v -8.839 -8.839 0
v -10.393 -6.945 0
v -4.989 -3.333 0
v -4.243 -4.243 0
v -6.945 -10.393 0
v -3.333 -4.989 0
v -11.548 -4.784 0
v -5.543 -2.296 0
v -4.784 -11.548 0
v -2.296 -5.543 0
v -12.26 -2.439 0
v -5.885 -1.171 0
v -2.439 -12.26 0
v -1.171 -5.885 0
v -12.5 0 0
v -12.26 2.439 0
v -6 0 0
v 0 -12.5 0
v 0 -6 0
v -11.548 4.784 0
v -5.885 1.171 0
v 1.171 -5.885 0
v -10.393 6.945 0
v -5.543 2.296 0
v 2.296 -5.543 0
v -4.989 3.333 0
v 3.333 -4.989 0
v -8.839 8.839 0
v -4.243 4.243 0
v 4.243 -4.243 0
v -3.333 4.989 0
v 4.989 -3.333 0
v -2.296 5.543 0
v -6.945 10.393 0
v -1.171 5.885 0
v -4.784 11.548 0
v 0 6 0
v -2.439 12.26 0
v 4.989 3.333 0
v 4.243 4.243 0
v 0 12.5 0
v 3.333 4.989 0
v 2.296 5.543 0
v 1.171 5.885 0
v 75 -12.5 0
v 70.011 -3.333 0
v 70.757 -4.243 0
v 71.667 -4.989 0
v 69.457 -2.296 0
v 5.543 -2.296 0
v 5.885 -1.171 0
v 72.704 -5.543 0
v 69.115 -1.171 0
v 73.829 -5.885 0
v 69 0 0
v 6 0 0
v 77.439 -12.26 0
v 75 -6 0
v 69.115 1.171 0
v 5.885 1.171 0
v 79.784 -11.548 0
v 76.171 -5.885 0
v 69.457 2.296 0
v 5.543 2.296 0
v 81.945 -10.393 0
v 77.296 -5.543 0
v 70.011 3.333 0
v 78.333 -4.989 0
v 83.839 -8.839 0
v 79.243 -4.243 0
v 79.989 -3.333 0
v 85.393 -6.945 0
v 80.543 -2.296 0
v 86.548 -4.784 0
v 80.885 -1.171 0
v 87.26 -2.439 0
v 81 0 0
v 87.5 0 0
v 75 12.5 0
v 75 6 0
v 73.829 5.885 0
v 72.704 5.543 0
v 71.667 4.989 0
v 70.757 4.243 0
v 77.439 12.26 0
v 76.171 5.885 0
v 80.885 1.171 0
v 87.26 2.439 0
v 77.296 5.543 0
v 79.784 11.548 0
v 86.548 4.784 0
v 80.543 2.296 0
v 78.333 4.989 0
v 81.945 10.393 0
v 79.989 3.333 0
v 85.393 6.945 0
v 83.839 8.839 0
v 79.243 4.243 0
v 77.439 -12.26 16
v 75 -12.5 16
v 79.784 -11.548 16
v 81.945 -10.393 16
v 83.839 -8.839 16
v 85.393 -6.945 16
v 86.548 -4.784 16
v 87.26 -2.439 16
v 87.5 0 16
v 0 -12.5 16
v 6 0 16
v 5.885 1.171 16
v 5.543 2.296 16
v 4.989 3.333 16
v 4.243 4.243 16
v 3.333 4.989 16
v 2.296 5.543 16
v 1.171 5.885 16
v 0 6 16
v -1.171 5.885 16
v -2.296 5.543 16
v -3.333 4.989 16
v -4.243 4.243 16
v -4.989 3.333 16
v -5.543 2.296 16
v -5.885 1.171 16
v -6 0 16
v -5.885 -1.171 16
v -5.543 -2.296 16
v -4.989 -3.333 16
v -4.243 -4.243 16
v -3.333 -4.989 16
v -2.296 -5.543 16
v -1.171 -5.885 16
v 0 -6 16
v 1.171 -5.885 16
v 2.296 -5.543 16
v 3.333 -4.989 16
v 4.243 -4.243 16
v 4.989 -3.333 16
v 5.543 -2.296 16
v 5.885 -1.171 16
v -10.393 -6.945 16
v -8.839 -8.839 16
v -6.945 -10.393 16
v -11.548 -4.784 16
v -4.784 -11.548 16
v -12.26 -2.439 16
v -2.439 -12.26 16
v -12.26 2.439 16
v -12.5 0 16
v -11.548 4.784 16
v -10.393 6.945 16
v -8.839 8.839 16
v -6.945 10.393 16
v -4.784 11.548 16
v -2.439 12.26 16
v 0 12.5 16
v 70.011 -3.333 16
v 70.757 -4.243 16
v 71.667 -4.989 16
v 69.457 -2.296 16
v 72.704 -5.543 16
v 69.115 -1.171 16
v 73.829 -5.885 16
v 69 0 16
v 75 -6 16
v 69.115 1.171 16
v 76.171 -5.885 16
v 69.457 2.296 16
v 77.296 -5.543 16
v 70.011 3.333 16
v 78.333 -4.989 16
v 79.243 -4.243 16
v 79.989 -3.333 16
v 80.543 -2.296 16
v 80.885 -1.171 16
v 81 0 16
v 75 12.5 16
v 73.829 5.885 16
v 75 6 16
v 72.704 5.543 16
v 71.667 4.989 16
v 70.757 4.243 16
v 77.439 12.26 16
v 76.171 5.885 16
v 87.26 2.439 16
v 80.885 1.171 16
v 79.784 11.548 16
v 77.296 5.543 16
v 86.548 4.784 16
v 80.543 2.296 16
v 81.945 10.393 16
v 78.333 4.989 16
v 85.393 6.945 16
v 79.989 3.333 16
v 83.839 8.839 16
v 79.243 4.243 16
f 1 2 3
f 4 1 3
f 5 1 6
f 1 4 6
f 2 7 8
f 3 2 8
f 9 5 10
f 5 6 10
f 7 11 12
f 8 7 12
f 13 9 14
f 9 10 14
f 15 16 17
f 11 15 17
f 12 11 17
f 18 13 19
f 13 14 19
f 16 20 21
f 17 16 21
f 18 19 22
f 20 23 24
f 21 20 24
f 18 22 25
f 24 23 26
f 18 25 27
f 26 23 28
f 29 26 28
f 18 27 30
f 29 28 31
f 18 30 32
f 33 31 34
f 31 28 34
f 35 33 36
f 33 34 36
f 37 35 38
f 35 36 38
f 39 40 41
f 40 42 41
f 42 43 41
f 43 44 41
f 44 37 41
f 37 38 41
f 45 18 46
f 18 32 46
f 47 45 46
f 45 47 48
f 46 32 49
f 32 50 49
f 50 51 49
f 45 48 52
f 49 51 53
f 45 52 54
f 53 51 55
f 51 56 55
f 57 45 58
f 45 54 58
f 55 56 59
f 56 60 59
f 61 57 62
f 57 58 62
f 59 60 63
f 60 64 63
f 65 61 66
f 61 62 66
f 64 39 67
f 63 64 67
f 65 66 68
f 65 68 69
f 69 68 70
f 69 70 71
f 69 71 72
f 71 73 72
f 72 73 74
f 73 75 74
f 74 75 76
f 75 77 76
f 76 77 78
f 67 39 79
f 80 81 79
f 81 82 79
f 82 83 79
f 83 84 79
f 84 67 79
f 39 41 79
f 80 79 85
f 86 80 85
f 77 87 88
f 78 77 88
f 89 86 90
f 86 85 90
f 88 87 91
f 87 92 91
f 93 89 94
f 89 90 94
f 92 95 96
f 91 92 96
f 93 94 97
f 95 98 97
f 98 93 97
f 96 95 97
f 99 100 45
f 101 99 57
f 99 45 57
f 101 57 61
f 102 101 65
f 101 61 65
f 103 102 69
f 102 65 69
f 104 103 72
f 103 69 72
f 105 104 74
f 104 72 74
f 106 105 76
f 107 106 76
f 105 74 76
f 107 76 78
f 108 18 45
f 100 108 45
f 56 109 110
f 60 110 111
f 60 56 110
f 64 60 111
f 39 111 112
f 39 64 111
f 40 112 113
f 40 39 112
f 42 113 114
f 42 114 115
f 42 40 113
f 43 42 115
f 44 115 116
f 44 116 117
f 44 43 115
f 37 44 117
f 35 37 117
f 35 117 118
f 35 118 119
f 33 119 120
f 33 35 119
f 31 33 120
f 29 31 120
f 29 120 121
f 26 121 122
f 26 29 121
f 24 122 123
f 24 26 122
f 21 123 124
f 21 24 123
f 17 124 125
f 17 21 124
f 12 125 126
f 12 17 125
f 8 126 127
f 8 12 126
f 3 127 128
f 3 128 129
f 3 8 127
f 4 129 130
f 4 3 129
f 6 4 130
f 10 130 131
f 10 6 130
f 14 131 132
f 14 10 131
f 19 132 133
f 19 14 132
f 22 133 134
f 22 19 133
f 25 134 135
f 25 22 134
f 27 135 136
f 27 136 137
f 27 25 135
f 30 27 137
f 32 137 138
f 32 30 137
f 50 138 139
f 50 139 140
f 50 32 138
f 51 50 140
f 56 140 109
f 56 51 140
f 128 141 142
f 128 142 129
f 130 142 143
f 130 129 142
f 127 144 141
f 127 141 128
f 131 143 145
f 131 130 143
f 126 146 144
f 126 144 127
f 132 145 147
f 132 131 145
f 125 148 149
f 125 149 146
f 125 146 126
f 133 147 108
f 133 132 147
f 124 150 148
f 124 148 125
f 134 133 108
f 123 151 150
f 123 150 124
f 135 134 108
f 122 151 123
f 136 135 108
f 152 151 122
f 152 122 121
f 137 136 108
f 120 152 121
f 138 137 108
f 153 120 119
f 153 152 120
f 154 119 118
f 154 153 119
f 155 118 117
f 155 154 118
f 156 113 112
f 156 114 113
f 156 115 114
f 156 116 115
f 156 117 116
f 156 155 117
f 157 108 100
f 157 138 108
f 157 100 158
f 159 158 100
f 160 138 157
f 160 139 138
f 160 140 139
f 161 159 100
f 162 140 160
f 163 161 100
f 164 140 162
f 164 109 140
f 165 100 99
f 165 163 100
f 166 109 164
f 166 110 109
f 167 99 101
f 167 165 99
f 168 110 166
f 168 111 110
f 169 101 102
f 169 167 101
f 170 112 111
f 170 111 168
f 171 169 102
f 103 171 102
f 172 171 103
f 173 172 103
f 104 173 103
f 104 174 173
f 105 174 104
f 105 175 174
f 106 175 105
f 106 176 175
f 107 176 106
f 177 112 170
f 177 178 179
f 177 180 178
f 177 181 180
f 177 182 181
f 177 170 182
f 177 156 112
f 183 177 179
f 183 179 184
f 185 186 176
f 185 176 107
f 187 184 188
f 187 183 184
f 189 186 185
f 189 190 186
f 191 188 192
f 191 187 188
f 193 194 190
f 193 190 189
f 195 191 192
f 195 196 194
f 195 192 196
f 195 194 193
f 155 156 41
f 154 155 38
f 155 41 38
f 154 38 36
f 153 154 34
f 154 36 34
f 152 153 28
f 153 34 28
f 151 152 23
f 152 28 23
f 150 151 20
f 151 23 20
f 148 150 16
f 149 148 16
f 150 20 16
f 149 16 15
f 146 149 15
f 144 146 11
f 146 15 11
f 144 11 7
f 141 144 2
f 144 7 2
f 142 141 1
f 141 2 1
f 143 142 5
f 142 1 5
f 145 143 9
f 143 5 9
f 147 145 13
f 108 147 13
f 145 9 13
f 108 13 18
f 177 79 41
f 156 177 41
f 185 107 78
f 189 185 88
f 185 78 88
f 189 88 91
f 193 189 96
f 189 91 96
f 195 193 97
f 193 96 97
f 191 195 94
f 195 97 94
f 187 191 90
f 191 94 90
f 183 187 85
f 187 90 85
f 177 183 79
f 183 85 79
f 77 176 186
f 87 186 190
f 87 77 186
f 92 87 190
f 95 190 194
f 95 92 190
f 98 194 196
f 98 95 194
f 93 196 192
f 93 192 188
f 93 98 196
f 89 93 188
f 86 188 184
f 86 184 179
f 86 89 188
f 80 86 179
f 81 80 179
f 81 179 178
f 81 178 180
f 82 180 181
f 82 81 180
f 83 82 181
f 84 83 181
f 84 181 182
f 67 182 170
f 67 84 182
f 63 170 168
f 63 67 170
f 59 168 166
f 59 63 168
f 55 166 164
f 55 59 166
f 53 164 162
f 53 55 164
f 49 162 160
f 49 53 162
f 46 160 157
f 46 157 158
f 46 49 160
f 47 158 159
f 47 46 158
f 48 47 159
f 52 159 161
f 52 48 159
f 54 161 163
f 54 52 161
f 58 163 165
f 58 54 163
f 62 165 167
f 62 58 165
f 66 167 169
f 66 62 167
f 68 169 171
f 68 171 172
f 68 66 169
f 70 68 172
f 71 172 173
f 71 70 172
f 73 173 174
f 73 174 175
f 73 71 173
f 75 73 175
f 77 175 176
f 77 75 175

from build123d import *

# Parameters (mm, degrees)
F0_R     = 6
F1_DEPTH = 16


# Not quite as in the source:
# - a feature names something its author has since deleted; it is built from what else it names


with BuildPart() as f1:
    # F0 (on Top) → F1 (new body)
    with BuildSketch(Plane.XY):
        with BuildLine():
            Line((75, 12.5), (0, 12.5))
            ThreePointArc((0, 12.5), (8.8388347648, 8.8388347648), (12.5, 0))
            ThreePointArc((12.5, 0), (8.8388347648, -8.8388347648), (0, -12.5))
            Line((0, -12.5), (75, -12.5))
            ThreePointArc((75, -12.5), (62.5, 0), (75, 12.5))
        make_face()
        with BuildLine():
            ThreePointArc((12.5, 0), (8.8388347648, 8.8388347648), (0, 12.5))
            ThreePointArc((0, 12.5), (-8.8388347648, 8.8388347648), (-12.5, 0))
            ThreePointArc((-12.5, 0), (-8.8388347648, -8.8388347648), (0, -12.5))
            ThreePointArc((0, -12.5), (8.8388347648, -8.8388347648), (12.5, 0))
        make_face()
        Circle(F0_R, mode=Mode.SUBTRACT)
        with BuildLine():
            ThreePointArc((87.5, 0), (83.8388347648, 8.8388347648), (75, 12.5))
            ThreePointArc((75, 12.5), (62.5, 0), (75, -12.5))
            ThreePointArc((75, -12.5), (83.8388347648, -8.8388347648), (87.5, 0))
        make_face()
        with Locations((75, 0)):
            Circle(F0_R, mode=Mode.SUBTRACT)
    extrude(amount=F1_DEPTH)


solid = f1.part
